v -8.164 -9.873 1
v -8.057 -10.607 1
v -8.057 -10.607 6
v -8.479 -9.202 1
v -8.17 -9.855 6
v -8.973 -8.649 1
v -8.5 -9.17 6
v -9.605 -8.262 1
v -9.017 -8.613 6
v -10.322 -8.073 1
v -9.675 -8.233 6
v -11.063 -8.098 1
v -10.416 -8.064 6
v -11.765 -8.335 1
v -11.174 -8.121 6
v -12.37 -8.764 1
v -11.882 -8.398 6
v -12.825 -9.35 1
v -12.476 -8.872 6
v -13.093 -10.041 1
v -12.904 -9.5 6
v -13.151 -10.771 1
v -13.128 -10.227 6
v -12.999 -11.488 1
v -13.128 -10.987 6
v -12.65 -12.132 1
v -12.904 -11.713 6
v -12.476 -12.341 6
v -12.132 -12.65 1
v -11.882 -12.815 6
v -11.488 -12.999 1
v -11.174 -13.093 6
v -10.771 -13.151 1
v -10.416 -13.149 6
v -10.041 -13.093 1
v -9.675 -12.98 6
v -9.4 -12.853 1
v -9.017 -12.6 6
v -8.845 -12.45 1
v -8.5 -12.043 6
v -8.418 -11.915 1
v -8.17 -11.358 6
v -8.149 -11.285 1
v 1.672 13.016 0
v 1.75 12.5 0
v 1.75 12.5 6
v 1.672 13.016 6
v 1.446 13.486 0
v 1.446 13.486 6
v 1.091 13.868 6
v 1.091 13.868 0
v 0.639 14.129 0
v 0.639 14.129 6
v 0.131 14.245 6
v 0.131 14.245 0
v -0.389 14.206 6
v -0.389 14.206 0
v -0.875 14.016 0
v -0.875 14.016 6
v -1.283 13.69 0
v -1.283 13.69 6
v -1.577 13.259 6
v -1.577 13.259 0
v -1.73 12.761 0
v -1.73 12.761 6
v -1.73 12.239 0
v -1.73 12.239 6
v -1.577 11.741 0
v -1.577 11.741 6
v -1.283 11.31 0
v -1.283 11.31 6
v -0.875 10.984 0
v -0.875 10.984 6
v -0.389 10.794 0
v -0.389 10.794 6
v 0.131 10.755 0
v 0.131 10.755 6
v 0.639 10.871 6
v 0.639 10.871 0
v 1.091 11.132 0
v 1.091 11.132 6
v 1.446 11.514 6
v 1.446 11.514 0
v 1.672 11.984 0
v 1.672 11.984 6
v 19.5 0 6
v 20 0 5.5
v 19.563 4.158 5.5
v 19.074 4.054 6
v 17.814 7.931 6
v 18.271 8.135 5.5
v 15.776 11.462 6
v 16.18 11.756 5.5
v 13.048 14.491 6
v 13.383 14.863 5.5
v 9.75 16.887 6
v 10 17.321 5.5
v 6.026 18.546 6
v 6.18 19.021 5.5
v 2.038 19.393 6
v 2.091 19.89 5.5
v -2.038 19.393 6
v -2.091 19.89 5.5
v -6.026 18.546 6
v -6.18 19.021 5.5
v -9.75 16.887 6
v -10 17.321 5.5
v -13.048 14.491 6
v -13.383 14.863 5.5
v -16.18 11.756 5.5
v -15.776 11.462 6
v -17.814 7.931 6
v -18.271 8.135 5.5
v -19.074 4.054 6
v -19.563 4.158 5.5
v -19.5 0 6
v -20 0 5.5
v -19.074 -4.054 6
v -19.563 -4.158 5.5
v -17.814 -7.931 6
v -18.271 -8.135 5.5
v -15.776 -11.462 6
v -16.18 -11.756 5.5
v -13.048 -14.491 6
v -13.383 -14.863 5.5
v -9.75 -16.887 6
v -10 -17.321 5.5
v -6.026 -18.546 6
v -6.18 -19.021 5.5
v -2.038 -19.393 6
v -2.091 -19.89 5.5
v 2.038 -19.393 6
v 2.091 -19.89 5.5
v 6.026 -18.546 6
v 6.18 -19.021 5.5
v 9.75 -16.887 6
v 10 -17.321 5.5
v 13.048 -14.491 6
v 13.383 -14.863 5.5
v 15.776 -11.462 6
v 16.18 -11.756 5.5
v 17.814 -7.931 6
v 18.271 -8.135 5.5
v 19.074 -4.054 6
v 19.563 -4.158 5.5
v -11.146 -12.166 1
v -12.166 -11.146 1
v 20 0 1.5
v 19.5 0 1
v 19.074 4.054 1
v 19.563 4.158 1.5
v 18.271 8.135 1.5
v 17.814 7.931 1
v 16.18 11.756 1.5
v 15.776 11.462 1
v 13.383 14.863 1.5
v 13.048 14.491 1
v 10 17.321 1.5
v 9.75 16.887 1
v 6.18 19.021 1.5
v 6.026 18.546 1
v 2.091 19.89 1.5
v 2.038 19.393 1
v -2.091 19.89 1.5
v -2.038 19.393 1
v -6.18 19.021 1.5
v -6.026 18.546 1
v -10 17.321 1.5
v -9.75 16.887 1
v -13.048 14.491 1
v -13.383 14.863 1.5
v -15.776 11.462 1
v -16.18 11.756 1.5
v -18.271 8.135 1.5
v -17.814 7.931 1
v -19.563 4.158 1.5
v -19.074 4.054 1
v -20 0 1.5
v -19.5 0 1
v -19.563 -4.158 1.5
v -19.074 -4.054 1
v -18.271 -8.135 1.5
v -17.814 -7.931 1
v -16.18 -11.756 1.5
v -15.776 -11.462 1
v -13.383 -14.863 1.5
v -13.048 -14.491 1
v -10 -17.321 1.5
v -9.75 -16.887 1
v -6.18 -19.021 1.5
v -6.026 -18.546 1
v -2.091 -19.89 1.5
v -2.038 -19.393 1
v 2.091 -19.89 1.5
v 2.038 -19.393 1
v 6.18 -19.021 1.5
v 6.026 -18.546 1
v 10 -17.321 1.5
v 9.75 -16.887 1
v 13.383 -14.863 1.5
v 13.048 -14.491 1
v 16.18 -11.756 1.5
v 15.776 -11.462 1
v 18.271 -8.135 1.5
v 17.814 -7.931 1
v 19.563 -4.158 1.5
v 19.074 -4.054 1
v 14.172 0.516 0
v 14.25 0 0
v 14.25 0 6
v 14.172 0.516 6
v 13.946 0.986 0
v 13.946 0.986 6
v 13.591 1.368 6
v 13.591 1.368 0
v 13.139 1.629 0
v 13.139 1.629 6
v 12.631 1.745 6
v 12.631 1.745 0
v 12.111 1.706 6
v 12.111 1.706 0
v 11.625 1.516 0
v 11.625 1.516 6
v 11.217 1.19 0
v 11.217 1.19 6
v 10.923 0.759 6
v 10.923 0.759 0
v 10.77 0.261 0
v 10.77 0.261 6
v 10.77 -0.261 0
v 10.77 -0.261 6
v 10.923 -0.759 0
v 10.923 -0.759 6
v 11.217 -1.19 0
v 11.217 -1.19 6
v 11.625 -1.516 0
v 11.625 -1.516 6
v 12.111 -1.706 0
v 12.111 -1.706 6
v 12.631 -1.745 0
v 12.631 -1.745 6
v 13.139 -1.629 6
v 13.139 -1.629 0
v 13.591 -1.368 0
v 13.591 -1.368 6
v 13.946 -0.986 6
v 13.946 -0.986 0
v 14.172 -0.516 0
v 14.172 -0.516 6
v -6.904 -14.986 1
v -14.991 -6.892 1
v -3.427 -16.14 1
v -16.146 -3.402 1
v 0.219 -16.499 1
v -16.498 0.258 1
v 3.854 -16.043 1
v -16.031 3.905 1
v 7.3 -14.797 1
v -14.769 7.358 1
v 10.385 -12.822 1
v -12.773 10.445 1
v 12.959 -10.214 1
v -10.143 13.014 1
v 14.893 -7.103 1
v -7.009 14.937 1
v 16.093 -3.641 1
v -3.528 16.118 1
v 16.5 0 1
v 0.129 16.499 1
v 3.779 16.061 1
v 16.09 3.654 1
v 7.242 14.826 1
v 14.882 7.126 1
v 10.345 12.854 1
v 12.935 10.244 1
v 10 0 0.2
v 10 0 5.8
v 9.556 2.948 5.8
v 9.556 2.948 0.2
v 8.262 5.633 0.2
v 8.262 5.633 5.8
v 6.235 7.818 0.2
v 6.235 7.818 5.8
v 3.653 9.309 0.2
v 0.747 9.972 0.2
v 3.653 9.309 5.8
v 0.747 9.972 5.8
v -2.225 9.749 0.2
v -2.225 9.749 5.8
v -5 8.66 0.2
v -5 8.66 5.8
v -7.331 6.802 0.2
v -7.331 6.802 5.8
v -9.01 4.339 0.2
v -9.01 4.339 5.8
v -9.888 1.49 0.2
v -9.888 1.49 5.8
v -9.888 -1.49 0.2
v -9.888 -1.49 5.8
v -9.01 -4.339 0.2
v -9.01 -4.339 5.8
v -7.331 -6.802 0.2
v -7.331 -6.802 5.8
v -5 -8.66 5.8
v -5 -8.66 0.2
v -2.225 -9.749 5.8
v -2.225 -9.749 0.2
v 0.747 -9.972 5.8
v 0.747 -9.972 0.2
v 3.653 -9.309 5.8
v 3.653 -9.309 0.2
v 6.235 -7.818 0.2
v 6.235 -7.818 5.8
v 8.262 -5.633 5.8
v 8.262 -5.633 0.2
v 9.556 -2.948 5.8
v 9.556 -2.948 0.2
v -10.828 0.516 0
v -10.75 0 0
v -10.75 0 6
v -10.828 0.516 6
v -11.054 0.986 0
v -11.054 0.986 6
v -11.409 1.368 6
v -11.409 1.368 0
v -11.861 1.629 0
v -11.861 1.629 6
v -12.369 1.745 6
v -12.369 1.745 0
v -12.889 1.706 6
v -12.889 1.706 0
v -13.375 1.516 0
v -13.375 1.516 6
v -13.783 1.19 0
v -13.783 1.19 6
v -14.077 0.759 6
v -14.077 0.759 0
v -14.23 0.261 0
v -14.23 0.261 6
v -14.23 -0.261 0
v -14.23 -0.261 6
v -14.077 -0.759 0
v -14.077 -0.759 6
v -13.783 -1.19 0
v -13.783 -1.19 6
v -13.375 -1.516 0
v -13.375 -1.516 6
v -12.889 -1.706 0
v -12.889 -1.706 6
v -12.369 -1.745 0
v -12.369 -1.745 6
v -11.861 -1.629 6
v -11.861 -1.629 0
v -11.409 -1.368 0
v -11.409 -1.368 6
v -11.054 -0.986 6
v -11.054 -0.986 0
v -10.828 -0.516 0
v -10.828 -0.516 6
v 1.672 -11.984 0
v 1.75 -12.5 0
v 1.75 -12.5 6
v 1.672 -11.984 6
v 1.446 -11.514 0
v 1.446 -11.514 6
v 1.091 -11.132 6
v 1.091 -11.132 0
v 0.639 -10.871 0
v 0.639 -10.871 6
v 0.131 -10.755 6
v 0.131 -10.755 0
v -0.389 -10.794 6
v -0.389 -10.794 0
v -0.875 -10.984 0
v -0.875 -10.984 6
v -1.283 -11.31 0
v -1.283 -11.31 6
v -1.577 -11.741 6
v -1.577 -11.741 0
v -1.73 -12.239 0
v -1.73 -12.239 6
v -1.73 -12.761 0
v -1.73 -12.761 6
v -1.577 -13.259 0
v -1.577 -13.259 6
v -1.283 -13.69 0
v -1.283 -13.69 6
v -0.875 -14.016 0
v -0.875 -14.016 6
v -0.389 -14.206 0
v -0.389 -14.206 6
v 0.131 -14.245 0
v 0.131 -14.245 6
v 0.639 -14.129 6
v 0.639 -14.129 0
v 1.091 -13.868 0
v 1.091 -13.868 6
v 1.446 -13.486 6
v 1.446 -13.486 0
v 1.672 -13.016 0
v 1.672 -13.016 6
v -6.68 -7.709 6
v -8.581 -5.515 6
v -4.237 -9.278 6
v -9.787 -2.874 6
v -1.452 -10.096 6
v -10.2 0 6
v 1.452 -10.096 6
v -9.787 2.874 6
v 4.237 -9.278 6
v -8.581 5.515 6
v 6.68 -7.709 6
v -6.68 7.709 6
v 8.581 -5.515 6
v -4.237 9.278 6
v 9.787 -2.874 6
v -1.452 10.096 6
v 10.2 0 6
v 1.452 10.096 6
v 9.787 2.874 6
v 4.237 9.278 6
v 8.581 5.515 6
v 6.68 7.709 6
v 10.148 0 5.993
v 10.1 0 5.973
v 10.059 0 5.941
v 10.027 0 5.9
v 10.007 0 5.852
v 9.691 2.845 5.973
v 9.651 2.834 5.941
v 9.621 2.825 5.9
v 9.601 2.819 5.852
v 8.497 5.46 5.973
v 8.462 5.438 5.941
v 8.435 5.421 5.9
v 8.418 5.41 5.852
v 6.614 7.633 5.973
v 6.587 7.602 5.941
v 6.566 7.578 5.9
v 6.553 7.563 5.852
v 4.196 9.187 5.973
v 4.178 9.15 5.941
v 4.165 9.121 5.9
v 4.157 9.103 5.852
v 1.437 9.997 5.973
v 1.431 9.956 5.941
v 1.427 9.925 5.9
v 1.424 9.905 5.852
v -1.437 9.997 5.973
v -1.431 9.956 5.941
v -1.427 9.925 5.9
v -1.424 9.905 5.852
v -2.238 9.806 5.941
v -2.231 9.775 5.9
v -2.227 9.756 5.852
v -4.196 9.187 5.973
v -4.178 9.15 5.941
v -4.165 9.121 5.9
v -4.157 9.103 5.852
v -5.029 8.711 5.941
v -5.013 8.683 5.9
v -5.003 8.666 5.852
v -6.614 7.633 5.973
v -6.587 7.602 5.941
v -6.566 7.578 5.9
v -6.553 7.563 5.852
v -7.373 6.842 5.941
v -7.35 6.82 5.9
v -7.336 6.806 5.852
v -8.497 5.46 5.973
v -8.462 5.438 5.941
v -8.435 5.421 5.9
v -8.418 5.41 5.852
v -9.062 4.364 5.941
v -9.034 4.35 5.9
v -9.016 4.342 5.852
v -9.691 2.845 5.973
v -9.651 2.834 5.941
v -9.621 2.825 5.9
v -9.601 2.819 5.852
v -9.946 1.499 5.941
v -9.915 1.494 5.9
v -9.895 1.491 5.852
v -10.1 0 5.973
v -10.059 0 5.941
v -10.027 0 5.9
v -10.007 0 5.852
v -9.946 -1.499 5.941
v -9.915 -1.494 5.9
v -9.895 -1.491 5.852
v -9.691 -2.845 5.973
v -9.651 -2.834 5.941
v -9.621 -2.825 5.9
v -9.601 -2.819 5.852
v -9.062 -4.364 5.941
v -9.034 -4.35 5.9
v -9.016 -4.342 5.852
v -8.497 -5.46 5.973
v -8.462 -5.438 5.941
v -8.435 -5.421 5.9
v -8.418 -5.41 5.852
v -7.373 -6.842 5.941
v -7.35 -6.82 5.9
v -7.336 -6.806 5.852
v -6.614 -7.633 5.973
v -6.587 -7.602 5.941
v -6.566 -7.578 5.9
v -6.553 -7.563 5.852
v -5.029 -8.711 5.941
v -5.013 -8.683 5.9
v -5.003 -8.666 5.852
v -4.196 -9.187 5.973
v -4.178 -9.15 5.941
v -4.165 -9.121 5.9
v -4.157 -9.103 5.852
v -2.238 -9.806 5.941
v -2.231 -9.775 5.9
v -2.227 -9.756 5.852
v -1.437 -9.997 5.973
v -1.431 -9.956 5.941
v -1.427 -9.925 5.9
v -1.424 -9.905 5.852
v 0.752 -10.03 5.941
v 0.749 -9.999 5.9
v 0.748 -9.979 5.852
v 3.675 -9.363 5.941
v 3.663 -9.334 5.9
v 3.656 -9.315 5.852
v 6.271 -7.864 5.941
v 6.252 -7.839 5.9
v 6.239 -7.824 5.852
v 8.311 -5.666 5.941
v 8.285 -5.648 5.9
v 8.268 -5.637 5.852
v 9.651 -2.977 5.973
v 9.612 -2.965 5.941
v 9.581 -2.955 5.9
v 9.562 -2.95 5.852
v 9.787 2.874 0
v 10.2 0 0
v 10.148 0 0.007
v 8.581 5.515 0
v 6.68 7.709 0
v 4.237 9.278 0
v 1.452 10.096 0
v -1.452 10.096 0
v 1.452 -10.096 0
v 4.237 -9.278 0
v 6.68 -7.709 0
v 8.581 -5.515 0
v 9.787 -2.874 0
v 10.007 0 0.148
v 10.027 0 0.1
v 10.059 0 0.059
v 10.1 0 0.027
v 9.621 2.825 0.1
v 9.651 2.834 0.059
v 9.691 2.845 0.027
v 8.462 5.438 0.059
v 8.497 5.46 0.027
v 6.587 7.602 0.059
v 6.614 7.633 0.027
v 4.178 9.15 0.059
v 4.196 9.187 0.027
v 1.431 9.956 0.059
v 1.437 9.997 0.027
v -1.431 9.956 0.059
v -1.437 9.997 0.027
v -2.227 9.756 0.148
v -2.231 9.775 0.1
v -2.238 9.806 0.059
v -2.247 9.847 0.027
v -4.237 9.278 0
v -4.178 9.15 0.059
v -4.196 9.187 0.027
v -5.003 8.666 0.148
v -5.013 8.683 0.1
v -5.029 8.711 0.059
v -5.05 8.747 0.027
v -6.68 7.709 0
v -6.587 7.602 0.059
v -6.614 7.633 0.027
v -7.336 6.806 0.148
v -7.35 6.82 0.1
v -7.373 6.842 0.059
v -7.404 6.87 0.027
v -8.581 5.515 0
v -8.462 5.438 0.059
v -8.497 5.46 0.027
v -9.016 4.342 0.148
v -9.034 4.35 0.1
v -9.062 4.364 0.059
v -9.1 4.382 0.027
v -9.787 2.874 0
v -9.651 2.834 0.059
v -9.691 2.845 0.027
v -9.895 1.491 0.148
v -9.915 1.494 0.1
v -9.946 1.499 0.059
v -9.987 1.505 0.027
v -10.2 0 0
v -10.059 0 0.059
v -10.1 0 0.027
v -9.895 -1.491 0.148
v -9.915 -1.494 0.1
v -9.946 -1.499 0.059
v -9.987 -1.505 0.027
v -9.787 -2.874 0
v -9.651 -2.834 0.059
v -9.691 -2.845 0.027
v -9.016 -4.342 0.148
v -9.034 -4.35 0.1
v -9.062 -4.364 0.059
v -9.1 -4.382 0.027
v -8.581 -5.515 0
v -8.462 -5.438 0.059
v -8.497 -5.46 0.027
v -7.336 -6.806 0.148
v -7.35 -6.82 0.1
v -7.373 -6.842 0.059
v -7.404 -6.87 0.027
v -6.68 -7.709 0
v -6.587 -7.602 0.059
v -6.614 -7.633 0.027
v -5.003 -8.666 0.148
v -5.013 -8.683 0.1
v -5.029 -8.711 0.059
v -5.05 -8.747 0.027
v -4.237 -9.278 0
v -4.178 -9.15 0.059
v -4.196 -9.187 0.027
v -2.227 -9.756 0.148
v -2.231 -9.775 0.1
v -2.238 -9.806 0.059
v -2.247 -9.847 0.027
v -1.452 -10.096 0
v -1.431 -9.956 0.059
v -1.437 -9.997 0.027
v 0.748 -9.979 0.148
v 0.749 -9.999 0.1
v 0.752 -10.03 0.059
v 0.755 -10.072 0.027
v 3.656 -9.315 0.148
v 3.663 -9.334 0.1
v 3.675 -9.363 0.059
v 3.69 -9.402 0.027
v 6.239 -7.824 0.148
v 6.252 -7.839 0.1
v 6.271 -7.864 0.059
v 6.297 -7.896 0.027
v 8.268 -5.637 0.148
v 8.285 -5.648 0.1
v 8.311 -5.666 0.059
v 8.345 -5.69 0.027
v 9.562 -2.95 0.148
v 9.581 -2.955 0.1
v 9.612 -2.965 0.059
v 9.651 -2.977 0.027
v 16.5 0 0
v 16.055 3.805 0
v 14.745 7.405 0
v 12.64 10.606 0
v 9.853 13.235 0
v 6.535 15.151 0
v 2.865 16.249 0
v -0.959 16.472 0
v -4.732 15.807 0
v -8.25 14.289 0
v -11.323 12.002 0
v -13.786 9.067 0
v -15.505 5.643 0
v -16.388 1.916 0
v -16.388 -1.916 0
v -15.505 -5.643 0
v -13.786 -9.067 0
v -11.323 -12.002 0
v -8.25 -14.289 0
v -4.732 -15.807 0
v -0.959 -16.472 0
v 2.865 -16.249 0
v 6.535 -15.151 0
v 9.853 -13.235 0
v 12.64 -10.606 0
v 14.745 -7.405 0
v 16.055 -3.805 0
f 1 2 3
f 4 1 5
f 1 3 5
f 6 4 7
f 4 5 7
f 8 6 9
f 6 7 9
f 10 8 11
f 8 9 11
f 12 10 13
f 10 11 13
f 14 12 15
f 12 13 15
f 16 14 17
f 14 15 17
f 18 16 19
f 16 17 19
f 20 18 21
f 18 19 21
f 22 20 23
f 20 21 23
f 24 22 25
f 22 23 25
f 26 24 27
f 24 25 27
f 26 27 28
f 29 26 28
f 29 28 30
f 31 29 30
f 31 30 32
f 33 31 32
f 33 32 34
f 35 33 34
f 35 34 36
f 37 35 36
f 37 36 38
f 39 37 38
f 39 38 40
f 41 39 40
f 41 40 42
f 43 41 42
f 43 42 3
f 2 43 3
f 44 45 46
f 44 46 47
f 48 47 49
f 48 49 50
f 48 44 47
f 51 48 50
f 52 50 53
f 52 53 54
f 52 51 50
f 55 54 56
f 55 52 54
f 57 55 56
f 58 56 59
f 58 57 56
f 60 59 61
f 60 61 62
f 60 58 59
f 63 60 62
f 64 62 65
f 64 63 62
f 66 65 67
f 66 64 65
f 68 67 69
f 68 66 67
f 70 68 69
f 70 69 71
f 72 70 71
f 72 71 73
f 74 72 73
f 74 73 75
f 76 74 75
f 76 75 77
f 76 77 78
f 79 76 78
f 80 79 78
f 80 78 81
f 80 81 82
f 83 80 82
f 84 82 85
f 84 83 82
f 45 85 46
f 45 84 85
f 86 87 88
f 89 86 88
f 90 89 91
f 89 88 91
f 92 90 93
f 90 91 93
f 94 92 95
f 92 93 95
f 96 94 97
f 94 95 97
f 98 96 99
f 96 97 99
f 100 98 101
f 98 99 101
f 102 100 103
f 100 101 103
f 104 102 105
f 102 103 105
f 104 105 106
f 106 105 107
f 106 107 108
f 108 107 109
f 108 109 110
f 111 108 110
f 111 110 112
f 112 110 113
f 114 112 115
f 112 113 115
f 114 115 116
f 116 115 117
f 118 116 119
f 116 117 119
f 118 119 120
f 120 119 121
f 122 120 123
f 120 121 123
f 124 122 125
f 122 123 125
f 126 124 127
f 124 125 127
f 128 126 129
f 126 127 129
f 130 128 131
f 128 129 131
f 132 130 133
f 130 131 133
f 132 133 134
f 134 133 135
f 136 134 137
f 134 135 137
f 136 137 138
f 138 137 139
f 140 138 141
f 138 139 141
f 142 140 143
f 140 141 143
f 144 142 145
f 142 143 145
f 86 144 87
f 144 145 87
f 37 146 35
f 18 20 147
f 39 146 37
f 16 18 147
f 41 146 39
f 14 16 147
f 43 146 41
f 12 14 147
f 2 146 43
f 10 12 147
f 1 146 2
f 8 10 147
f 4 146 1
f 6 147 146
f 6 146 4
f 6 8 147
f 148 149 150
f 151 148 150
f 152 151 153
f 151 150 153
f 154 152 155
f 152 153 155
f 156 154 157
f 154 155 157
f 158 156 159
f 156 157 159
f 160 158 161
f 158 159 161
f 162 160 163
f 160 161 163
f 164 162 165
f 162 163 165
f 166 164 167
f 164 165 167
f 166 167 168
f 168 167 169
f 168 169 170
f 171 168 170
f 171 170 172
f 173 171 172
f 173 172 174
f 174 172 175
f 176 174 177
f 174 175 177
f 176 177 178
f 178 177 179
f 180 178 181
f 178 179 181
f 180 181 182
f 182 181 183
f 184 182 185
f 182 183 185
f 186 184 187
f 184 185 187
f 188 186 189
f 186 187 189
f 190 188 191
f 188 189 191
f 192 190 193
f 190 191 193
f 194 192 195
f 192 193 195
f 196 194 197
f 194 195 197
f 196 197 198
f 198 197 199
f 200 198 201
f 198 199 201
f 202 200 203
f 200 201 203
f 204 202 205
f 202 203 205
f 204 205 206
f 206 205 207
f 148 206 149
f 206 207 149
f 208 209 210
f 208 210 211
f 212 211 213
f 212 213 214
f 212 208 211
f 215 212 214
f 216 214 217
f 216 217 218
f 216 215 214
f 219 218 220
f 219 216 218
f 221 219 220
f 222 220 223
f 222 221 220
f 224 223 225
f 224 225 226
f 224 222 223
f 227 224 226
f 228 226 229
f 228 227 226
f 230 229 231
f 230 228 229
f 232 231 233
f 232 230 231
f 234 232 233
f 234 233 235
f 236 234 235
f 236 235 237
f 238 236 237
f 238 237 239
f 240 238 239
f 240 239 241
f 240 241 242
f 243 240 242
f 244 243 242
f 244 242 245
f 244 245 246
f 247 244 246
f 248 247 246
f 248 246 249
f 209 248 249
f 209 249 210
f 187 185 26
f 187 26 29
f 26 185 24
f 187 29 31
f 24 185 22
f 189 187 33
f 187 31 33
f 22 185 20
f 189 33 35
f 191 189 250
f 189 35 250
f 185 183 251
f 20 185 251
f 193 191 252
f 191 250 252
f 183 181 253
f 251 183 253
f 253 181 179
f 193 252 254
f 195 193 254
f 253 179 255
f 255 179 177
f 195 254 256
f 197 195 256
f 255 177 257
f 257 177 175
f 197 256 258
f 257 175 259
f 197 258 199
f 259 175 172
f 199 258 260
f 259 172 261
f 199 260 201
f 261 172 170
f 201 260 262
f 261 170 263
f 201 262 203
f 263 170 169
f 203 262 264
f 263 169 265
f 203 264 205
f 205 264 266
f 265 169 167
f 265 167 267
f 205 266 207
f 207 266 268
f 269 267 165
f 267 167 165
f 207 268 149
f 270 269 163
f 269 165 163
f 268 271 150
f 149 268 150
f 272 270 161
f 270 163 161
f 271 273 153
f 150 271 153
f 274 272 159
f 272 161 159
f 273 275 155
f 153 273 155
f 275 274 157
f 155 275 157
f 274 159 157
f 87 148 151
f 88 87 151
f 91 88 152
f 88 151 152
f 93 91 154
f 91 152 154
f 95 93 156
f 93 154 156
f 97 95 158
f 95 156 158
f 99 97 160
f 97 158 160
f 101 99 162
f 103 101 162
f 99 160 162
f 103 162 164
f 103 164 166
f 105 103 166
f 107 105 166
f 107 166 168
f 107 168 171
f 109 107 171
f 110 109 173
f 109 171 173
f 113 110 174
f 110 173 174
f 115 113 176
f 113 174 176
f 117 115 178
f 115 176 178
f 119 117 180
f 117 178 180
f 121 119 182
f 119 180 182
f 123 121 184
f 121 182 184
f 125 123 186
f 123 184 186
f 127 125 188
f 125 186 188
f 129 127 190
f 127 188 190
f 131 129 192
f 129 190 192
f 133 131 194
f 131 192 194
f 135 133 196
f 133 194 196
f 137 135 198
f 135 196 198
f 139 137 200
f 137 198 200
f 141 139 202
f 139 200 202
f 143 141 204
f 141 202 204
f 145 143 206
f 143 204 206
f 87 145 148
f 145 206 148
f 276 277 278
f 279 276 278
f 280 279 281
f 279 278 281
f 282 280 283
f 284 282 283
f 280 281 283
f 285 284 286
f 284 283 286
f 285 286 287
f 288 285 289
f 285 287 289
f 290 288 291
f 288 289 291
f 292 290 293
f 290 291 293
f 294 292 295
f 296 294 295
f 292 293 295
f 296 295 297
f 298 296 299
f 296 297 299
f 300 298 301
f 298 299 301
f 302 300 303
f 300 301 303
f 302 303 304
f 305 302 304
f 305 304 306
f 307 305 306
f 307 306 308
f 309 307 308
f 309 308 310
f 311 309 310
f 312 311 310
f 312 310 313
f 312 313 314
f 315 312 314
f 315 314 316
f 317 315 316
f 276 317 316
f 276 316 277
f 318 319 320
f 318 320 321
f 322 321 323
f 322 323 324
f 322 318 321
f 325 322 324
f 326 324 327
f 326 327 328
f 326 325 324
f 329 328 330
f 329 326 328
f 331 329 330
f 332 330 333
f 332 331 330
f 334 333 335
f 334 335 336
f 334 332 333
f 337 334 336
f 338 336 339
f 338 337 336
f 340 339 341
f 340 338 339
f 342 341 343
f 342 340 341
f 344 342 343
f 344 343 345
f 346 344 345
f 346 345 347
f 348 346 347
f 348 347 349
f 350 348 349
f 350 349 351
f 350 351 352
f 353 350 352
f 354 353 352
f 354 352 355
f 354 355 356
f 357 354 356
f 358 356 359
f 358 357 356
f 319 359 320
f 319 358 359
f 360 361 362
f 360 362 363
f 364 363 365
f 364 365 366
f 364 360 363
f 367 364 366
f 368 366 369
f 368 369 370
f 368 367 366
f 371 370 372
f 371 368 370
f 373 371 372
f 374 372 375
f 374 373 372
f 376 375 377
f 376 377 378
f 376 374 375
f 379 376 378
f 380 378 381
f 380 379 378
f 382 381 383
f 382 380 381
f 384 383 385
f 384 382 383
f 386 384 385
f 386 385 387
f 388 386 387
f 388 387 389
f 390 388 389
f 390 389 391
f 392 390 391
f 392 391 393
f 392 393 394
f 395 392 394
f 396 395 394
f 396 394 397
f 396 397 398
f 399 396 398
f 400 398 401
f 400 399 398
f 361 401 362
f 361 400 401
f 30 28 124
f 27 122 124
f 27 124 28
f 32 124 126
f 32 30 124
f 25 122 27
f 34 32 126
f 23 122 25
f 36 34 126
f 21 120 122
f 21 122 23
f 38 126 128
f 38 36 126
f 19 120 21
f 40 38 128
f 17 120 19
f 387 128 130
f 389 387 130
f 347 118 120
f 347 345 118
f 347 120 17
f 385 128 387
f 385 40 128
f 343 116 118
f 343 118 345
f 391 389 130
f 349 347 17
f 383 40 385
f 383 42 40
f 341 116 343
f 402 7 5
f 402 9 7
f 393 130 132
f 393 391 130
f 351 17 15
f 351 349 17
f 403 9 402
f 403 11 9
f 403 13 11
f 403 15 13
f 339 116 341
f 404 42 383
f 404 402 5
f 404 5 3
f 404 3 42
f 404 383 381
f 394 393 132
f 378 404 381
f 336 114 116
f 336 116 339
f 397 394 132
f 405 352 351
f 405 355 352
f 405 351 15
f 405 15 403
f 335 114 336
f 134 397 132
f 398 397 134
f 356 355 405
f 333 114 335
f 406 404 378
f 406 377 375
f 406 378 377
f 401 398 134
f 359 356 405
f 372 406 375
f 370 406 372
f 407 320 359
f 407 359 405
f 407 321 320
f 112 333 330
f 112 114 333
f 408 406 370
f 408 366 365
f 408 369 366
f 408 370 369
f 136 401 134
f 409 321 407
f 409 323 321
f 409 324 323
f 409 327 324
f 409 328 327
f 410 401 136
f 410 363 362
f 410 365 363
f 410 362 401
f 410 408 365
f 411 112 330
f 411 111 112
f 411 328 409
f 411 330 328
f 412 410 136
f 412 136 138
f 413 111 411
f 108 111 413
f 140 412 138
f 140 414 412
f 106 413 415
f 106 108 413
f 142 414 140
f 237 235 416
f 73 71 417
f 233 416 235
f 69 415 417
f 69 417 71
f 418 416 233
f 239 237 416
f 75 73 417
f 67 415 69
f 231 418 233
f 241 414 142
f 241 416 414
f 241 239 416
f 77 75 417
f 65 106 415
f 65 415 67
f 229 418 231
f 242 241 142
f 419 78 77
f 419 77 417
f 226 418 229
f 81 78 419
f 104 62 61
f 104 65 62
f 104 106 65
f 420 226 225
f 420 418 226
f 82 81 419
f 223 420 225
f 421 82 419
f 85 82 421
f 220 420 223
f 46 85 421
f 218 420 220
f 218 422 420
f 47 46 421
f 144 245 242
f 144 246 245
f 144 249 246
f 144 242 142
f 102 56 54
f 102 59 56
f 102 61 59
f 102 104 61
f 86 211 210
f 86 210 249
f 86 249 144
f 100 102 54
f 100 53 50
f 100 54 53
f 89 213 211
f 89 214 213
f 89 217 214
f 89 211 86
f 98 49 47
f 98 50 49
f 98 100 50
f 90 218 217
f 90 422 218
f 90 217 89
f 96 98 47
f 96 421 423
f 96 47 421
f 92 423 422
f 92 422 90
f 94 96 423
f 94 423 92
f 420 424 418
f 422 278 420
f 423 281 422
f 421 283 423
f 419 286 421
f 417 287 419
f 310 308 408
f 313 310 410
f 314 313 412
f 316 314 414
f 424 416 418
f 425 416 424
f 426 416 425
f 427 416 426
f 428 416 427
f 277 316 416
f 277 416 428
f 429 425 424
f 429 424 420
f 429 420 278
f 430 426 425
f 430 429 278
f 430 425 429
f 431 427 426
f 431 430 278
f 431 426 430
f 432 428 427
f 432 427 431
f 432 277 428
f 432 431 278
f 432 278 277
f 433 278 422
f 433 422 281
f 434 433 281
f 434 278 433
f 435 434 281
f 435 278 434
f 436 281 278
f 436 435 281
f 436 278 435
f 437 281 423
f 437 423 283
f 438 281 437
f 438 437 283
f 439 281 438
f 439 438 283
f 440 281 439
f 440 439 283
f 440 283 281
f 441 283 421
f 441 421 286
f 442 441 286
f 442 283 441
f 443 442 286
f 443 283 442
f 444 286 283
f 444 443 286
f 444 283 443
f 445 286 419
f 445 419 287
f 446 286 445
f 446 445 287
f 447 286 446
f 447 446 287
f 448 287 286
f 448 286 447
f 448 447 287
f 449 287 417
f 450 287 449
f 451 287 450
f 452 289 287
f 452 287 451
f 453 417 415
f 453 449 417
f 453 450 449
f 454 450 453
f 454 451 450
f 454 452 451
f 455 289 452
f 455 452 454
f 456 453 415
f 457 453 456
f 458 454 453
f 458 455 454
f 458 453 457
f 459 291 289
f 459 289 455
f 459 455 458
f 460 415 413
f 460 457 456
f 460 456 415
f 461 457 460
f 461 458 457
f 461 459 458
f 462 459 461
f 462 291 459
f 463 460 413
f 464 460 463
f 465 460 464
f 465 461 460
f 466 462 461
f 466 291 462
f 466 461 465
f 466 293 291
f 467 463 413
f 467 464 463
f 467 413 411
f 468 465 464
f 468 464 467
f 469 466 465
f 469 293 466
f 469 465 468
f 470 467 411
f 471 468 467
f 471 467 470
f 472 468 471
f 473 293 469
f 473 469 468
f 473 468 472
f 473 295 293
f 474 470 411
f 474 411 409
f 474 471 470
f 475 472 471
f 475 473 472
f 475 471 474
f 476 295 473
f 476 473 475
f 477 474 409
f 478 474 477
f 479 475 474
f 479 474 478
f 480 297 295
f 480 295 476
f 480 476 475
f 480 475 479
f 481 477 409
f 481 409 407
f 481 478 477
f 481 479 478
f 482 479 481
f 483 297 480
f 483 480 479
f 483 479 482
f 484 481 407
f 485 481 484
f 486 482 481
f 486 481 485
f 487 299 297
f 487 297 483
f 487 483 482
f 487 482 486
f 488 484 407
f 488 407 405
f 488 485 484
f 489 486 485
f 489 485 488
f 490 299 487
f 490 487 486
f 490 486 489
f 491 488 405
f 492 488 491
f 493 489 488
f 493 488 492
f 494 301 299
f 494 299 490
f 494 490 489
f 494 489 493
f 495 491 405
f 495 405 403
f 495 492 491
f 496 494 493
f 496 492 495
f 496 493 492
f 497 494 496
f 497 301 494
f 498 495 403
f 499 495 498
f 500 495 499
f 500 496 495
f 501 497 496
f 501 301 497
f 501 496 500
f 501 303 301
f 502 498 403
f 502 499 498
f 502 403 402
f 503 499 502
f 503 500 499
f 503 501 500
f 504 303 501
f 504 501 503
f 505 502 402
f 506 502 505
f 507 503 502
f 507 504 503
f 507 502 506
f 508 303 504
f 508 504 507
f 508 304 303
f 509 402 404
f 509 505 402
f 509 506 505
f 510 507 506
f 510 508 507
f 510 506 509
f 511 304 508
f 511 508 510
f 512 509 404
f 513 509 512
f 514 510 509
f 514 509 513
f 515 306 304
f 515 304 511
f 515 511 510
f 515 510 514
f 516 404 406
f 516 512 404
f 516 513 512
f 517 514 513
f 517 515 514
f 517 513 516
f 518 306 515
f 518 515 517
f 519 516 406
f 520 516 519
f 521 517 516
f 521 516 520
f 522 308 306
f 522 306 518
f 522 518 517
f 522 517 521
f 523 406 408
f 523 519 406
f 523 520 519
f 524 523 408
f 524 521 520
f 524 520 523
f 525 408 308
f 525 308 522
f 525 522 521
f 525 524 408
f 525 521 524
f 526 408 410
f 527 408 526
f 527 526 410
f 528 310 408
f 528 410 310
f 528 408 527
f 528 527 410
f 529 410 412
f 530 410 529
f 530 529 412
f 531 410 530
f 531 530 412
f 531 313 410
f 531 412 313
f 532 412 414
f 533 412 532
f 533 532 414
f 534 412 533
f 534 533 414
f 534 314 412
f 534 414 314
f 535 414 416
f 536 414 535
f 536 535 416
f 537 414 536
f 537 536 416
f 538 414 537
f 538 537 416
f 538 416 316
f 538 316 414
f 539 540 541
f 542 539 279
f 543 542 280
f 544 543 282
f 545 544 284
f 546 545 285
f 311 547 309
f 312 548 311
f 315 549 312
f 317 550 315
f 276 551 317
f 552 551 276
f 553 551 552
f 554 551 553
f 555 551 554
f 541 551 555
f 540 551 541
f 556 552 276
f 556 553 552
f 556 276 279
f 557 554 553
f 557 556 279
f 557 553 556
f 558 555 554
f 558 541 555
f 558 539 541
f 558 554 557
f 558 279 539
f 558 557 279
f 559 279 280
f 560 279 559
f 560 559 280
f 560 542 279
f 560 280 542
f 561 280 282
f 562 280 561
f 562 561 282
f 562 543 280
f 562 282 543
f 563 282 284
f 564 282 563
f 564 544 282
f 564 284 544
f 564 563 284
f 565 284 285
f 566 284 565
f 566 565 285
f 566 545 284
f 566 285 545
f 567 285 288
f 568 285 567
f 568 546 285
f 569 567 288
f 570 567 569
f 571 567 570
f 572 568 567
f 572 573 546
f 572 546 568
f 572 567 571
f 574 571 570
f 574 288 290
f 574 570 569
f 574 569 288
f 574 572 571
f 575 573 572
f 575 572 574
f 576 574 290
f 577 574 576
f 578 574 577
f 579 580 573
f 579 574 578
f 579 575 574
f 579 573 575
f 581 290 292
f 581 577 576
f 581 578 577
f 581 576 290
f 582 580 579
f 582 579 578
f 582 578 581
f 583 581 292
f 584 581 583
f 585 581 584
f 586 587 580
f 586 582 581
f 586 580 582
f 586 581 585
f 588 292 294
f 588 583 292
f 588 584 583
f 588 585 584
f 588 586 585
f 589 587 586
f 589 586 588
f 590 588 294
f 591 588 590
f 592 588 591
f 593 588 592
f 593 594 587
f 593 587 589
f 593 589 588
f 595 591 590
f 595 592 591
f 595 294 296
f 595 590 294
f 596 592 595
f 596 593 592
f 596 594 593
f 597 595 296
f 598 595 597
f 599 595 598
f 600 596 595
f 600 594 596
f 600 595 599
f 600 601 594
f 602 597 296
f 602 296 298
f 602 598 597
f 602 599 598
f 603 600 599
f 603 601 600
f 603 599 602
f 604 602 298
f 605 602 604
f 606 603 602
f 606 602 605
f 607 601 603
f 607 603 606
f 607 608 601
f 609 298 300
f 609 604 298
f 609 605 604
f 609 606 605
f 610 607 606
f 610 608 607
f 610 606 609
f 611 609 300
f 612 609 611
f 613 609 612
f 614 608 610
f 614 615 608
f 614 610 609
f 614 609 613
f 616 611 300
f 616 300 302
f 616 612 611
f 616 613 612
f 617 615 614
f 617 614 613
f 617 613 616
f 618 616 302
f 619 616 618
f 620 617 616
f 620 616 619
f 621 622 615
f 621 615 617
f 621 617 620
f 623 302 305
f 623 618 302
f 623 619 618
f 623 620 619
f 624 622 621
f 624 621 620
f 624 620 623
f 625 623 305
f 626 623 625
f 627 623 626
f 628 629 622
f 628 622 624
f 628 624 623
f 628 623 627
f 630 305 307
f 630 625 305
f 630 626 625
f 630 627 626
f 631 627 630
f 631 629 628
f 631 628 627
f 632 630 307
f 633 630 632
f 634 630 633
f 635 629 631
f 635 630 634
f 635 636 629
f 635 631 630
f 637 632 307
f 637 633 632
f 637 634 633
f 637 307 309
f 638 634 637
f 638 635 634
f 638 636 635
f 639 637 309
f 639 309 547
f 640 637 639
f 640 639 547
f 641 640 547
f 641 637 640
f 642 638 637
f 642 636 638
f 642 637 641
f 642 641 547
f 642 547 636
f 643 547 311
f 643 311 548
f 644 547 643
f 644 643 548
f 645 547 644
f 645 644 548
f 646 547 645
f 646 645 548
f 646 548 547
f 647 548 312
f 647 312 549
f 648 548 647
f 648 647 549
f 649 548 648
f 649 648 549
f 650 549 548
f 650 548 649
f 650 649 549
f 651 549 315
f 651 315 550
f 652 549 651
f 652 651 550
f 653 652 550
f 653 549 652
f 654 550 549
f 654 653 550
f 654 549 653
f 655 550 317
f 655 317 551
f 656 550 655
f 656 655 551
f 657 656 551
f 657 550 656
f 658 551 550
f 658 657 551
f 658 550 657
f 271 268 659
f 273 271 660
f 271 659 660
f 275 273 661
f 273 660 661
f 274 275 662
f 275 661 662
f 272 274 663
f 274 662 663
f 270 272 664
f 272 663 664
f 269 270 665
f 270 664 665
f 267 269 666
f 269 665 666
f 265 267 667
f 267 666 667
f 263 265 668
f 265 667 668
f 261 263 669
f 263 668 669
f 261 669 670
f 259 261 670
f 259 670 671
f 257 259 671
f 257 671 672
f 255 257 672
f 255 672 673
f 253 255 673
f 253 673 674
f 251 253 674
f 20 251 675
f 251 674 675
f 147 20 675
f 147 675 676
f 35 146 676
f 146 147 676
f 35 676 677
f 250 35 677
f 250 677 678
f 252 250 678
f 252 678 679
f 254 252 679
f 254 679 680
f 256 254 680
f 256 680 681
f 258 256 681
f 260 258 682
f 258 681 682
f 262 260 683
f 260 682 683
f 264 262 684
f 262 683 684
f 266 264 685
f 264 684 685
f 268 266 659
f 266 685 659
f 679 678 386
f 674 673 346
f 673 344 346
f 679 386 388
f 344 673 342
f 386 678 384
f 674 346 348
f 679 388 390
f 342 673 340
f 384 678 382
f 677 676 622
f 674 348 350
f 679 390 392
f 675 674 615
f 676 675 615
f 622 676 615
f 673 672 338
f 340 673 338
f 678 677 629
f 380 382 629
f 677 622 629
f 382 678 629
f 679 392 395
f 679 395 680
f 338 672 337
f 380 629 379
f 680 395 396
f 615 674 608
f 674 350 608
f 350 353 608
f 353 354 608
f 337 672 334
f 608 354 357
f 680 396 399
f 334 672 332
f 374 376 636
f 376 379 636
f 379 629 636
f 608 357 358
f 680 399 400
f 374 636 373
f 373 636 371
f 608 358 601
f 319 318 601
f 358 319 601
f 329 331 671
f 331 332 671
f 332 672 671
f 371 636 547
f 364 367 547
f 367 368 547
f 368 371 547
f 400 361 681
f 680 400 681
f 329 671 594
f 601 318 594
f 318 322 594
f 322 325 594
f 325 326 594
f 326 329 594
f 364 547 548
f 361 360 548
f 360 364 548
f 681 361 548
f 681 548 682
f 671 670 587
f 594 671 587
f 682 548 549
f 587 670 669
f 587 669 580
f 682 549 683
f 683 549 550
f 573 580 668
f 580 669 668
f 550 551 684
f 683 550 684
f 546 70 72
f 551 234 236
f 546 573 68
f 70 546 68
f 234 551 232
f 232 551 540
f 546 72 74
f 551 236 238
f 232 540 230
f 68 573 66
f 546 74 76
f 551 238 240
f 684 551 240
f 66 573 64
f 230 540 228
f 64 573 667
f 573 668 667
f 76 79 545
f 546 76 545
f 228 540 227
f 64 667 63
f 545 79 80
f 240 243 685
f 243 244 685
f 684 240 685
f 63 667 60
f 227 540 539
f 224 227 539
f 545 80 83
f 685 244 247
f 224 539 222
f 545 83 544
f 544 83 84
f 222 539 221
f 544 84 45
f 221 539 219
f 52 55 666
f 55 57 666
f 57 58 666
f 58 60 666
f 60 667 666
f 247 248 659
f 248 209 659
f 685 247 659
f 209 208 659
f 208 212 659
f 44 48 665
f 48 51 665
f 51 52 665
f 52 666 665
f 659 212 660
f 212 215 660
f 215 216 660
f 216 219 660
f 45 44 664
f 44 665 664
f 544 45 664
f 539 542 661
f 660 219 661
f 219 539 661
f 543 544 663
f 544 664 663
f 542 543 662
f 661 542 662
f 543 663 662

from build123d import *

# Parameters (mm, degrees)
SKETCH1_R           = 16.5
SKETCH1_R_2         = 9.5
SKETCH1_R_3         = 1.75
BOSS_EXTRUDE1_DEPTH = 6
SKETCH2_R           = 2.8
CUT_EXTRUDE1_DEPTH  = 3
BOSS_EXTRUDE2_START = -5
SKETCH3_R           = 20
SKETCH3_R_2         = 1.75
SKETCH3_R_3         = 2.8
BOSS_EXTRUDE2_DEPTH = 5
SKETCH6_R           = 2.55
CUT_EXTRUDE3_DEPTH  = 5
SKETCH7_R           = 10
CUT_EXTRUDE4_DEPTH  = 29.91366459
FILLET1_R           = 0.2
CHAMFER1_SIZE       = 0.5


with BuildPart() as part:
    # Sketch1 → Boss-Extrude1 (new body)
    with BuildSketch(Plane.XY):
        Circle(SKETCH1_R)
        Circle(SKETCH1_R_2, mode=Mode.SUBTRACT)
        with Locations((12.5, 0)):
            Circle(SKETCH1_R_3, mode=Mode.SUBTRACT)
        with Locations((0, -12.5)):
            Circle(SKETCH1_R_3, mode=Mode.SUBTRACT)
        with Locations((-12.5, 0)):
            Circle(SKETCH1_R_3, mode=Mode.SUBTRACT)
        with Locations((0, 12.5)):
            Circle(SKETCH1_R_3, mode=Mode.SUBTRACT)
    extrude(amount=BOSS_EXTRUDE1_DEPTH)

    # Sketch2 → Cut-Extrude1 (cut)
    with BuildSketch(Plane.XY.offset(6)):
        with Locations((12.5, 0)):
            Circle(SKETCH2_R)
    extrude(amount=-CUT_EXTRUDE1_DEPTH, mode=Mode.SUBTRACT)

    # Sketch3 → Boss-Extrude2 (add)
    with BuildSketch(Plane.XY.offset(6).offset(BOSS_EXTRUDE2_START)):
        Circle(SKETCH3_R)
        with Locations((12.5, 0)):
            Circle(SKETCH3_R_2, mode=Mode.SUBTRACT)
        with Locations((0, -12.5)):
            Circle(SKETCH3_R_3, mode=Mode.SUBTRACT)
        with Locations((-12.5, 0)):
            Circle(SKETCH3_R_3, mode=Mode.SUBTRACT)
        with Locations((0, 12.5)):
            Circle(SKETCH3_R_3, mode=Mode.SUBTRACT)
    extrude(amount=BOSS_EXTRUDE2_DEPTH)

    # Sketch6 → Cut-Extrude3 (cut)
    with BuildSketch(Plane.XY.offset(6)):
        with Locations((-10.606601718, -10.606601718)):
            Circle(SKETCH6_R)
    extrude(amount=-CUT_EXTRUDE3_DEPTH, mode=Mode.SUBTRACT)

    # Sketch7 → Cut-Extrude4 (cut, through all)
    with BuildSketch(Plane.XY.offset(6)):
        Circle(SKETCH7_R)
    extrude(amount=-CUT_EXTRUDE4_DEPTH, mode=Mode.SUBTRACT)

    # Fillet1
    fillet1_edges = [part.edges().sort_by_distance(p)[0] for p in [
        (-10, 0, 0),
        (-10, 0, 6),
    ]]
    fillet(fillet1_edges, radius=FILLET1_R)

    # Chamfer1
    chamfer1_edges = [part.edges().sort_by_distance(p)[0] for p in [
        (-20, 0, 6),
        (-20, 0, 1),
    ]]
    chamfer(chamfer1_edges, length=CHAMFER1_SIZE)


solid = part.part
